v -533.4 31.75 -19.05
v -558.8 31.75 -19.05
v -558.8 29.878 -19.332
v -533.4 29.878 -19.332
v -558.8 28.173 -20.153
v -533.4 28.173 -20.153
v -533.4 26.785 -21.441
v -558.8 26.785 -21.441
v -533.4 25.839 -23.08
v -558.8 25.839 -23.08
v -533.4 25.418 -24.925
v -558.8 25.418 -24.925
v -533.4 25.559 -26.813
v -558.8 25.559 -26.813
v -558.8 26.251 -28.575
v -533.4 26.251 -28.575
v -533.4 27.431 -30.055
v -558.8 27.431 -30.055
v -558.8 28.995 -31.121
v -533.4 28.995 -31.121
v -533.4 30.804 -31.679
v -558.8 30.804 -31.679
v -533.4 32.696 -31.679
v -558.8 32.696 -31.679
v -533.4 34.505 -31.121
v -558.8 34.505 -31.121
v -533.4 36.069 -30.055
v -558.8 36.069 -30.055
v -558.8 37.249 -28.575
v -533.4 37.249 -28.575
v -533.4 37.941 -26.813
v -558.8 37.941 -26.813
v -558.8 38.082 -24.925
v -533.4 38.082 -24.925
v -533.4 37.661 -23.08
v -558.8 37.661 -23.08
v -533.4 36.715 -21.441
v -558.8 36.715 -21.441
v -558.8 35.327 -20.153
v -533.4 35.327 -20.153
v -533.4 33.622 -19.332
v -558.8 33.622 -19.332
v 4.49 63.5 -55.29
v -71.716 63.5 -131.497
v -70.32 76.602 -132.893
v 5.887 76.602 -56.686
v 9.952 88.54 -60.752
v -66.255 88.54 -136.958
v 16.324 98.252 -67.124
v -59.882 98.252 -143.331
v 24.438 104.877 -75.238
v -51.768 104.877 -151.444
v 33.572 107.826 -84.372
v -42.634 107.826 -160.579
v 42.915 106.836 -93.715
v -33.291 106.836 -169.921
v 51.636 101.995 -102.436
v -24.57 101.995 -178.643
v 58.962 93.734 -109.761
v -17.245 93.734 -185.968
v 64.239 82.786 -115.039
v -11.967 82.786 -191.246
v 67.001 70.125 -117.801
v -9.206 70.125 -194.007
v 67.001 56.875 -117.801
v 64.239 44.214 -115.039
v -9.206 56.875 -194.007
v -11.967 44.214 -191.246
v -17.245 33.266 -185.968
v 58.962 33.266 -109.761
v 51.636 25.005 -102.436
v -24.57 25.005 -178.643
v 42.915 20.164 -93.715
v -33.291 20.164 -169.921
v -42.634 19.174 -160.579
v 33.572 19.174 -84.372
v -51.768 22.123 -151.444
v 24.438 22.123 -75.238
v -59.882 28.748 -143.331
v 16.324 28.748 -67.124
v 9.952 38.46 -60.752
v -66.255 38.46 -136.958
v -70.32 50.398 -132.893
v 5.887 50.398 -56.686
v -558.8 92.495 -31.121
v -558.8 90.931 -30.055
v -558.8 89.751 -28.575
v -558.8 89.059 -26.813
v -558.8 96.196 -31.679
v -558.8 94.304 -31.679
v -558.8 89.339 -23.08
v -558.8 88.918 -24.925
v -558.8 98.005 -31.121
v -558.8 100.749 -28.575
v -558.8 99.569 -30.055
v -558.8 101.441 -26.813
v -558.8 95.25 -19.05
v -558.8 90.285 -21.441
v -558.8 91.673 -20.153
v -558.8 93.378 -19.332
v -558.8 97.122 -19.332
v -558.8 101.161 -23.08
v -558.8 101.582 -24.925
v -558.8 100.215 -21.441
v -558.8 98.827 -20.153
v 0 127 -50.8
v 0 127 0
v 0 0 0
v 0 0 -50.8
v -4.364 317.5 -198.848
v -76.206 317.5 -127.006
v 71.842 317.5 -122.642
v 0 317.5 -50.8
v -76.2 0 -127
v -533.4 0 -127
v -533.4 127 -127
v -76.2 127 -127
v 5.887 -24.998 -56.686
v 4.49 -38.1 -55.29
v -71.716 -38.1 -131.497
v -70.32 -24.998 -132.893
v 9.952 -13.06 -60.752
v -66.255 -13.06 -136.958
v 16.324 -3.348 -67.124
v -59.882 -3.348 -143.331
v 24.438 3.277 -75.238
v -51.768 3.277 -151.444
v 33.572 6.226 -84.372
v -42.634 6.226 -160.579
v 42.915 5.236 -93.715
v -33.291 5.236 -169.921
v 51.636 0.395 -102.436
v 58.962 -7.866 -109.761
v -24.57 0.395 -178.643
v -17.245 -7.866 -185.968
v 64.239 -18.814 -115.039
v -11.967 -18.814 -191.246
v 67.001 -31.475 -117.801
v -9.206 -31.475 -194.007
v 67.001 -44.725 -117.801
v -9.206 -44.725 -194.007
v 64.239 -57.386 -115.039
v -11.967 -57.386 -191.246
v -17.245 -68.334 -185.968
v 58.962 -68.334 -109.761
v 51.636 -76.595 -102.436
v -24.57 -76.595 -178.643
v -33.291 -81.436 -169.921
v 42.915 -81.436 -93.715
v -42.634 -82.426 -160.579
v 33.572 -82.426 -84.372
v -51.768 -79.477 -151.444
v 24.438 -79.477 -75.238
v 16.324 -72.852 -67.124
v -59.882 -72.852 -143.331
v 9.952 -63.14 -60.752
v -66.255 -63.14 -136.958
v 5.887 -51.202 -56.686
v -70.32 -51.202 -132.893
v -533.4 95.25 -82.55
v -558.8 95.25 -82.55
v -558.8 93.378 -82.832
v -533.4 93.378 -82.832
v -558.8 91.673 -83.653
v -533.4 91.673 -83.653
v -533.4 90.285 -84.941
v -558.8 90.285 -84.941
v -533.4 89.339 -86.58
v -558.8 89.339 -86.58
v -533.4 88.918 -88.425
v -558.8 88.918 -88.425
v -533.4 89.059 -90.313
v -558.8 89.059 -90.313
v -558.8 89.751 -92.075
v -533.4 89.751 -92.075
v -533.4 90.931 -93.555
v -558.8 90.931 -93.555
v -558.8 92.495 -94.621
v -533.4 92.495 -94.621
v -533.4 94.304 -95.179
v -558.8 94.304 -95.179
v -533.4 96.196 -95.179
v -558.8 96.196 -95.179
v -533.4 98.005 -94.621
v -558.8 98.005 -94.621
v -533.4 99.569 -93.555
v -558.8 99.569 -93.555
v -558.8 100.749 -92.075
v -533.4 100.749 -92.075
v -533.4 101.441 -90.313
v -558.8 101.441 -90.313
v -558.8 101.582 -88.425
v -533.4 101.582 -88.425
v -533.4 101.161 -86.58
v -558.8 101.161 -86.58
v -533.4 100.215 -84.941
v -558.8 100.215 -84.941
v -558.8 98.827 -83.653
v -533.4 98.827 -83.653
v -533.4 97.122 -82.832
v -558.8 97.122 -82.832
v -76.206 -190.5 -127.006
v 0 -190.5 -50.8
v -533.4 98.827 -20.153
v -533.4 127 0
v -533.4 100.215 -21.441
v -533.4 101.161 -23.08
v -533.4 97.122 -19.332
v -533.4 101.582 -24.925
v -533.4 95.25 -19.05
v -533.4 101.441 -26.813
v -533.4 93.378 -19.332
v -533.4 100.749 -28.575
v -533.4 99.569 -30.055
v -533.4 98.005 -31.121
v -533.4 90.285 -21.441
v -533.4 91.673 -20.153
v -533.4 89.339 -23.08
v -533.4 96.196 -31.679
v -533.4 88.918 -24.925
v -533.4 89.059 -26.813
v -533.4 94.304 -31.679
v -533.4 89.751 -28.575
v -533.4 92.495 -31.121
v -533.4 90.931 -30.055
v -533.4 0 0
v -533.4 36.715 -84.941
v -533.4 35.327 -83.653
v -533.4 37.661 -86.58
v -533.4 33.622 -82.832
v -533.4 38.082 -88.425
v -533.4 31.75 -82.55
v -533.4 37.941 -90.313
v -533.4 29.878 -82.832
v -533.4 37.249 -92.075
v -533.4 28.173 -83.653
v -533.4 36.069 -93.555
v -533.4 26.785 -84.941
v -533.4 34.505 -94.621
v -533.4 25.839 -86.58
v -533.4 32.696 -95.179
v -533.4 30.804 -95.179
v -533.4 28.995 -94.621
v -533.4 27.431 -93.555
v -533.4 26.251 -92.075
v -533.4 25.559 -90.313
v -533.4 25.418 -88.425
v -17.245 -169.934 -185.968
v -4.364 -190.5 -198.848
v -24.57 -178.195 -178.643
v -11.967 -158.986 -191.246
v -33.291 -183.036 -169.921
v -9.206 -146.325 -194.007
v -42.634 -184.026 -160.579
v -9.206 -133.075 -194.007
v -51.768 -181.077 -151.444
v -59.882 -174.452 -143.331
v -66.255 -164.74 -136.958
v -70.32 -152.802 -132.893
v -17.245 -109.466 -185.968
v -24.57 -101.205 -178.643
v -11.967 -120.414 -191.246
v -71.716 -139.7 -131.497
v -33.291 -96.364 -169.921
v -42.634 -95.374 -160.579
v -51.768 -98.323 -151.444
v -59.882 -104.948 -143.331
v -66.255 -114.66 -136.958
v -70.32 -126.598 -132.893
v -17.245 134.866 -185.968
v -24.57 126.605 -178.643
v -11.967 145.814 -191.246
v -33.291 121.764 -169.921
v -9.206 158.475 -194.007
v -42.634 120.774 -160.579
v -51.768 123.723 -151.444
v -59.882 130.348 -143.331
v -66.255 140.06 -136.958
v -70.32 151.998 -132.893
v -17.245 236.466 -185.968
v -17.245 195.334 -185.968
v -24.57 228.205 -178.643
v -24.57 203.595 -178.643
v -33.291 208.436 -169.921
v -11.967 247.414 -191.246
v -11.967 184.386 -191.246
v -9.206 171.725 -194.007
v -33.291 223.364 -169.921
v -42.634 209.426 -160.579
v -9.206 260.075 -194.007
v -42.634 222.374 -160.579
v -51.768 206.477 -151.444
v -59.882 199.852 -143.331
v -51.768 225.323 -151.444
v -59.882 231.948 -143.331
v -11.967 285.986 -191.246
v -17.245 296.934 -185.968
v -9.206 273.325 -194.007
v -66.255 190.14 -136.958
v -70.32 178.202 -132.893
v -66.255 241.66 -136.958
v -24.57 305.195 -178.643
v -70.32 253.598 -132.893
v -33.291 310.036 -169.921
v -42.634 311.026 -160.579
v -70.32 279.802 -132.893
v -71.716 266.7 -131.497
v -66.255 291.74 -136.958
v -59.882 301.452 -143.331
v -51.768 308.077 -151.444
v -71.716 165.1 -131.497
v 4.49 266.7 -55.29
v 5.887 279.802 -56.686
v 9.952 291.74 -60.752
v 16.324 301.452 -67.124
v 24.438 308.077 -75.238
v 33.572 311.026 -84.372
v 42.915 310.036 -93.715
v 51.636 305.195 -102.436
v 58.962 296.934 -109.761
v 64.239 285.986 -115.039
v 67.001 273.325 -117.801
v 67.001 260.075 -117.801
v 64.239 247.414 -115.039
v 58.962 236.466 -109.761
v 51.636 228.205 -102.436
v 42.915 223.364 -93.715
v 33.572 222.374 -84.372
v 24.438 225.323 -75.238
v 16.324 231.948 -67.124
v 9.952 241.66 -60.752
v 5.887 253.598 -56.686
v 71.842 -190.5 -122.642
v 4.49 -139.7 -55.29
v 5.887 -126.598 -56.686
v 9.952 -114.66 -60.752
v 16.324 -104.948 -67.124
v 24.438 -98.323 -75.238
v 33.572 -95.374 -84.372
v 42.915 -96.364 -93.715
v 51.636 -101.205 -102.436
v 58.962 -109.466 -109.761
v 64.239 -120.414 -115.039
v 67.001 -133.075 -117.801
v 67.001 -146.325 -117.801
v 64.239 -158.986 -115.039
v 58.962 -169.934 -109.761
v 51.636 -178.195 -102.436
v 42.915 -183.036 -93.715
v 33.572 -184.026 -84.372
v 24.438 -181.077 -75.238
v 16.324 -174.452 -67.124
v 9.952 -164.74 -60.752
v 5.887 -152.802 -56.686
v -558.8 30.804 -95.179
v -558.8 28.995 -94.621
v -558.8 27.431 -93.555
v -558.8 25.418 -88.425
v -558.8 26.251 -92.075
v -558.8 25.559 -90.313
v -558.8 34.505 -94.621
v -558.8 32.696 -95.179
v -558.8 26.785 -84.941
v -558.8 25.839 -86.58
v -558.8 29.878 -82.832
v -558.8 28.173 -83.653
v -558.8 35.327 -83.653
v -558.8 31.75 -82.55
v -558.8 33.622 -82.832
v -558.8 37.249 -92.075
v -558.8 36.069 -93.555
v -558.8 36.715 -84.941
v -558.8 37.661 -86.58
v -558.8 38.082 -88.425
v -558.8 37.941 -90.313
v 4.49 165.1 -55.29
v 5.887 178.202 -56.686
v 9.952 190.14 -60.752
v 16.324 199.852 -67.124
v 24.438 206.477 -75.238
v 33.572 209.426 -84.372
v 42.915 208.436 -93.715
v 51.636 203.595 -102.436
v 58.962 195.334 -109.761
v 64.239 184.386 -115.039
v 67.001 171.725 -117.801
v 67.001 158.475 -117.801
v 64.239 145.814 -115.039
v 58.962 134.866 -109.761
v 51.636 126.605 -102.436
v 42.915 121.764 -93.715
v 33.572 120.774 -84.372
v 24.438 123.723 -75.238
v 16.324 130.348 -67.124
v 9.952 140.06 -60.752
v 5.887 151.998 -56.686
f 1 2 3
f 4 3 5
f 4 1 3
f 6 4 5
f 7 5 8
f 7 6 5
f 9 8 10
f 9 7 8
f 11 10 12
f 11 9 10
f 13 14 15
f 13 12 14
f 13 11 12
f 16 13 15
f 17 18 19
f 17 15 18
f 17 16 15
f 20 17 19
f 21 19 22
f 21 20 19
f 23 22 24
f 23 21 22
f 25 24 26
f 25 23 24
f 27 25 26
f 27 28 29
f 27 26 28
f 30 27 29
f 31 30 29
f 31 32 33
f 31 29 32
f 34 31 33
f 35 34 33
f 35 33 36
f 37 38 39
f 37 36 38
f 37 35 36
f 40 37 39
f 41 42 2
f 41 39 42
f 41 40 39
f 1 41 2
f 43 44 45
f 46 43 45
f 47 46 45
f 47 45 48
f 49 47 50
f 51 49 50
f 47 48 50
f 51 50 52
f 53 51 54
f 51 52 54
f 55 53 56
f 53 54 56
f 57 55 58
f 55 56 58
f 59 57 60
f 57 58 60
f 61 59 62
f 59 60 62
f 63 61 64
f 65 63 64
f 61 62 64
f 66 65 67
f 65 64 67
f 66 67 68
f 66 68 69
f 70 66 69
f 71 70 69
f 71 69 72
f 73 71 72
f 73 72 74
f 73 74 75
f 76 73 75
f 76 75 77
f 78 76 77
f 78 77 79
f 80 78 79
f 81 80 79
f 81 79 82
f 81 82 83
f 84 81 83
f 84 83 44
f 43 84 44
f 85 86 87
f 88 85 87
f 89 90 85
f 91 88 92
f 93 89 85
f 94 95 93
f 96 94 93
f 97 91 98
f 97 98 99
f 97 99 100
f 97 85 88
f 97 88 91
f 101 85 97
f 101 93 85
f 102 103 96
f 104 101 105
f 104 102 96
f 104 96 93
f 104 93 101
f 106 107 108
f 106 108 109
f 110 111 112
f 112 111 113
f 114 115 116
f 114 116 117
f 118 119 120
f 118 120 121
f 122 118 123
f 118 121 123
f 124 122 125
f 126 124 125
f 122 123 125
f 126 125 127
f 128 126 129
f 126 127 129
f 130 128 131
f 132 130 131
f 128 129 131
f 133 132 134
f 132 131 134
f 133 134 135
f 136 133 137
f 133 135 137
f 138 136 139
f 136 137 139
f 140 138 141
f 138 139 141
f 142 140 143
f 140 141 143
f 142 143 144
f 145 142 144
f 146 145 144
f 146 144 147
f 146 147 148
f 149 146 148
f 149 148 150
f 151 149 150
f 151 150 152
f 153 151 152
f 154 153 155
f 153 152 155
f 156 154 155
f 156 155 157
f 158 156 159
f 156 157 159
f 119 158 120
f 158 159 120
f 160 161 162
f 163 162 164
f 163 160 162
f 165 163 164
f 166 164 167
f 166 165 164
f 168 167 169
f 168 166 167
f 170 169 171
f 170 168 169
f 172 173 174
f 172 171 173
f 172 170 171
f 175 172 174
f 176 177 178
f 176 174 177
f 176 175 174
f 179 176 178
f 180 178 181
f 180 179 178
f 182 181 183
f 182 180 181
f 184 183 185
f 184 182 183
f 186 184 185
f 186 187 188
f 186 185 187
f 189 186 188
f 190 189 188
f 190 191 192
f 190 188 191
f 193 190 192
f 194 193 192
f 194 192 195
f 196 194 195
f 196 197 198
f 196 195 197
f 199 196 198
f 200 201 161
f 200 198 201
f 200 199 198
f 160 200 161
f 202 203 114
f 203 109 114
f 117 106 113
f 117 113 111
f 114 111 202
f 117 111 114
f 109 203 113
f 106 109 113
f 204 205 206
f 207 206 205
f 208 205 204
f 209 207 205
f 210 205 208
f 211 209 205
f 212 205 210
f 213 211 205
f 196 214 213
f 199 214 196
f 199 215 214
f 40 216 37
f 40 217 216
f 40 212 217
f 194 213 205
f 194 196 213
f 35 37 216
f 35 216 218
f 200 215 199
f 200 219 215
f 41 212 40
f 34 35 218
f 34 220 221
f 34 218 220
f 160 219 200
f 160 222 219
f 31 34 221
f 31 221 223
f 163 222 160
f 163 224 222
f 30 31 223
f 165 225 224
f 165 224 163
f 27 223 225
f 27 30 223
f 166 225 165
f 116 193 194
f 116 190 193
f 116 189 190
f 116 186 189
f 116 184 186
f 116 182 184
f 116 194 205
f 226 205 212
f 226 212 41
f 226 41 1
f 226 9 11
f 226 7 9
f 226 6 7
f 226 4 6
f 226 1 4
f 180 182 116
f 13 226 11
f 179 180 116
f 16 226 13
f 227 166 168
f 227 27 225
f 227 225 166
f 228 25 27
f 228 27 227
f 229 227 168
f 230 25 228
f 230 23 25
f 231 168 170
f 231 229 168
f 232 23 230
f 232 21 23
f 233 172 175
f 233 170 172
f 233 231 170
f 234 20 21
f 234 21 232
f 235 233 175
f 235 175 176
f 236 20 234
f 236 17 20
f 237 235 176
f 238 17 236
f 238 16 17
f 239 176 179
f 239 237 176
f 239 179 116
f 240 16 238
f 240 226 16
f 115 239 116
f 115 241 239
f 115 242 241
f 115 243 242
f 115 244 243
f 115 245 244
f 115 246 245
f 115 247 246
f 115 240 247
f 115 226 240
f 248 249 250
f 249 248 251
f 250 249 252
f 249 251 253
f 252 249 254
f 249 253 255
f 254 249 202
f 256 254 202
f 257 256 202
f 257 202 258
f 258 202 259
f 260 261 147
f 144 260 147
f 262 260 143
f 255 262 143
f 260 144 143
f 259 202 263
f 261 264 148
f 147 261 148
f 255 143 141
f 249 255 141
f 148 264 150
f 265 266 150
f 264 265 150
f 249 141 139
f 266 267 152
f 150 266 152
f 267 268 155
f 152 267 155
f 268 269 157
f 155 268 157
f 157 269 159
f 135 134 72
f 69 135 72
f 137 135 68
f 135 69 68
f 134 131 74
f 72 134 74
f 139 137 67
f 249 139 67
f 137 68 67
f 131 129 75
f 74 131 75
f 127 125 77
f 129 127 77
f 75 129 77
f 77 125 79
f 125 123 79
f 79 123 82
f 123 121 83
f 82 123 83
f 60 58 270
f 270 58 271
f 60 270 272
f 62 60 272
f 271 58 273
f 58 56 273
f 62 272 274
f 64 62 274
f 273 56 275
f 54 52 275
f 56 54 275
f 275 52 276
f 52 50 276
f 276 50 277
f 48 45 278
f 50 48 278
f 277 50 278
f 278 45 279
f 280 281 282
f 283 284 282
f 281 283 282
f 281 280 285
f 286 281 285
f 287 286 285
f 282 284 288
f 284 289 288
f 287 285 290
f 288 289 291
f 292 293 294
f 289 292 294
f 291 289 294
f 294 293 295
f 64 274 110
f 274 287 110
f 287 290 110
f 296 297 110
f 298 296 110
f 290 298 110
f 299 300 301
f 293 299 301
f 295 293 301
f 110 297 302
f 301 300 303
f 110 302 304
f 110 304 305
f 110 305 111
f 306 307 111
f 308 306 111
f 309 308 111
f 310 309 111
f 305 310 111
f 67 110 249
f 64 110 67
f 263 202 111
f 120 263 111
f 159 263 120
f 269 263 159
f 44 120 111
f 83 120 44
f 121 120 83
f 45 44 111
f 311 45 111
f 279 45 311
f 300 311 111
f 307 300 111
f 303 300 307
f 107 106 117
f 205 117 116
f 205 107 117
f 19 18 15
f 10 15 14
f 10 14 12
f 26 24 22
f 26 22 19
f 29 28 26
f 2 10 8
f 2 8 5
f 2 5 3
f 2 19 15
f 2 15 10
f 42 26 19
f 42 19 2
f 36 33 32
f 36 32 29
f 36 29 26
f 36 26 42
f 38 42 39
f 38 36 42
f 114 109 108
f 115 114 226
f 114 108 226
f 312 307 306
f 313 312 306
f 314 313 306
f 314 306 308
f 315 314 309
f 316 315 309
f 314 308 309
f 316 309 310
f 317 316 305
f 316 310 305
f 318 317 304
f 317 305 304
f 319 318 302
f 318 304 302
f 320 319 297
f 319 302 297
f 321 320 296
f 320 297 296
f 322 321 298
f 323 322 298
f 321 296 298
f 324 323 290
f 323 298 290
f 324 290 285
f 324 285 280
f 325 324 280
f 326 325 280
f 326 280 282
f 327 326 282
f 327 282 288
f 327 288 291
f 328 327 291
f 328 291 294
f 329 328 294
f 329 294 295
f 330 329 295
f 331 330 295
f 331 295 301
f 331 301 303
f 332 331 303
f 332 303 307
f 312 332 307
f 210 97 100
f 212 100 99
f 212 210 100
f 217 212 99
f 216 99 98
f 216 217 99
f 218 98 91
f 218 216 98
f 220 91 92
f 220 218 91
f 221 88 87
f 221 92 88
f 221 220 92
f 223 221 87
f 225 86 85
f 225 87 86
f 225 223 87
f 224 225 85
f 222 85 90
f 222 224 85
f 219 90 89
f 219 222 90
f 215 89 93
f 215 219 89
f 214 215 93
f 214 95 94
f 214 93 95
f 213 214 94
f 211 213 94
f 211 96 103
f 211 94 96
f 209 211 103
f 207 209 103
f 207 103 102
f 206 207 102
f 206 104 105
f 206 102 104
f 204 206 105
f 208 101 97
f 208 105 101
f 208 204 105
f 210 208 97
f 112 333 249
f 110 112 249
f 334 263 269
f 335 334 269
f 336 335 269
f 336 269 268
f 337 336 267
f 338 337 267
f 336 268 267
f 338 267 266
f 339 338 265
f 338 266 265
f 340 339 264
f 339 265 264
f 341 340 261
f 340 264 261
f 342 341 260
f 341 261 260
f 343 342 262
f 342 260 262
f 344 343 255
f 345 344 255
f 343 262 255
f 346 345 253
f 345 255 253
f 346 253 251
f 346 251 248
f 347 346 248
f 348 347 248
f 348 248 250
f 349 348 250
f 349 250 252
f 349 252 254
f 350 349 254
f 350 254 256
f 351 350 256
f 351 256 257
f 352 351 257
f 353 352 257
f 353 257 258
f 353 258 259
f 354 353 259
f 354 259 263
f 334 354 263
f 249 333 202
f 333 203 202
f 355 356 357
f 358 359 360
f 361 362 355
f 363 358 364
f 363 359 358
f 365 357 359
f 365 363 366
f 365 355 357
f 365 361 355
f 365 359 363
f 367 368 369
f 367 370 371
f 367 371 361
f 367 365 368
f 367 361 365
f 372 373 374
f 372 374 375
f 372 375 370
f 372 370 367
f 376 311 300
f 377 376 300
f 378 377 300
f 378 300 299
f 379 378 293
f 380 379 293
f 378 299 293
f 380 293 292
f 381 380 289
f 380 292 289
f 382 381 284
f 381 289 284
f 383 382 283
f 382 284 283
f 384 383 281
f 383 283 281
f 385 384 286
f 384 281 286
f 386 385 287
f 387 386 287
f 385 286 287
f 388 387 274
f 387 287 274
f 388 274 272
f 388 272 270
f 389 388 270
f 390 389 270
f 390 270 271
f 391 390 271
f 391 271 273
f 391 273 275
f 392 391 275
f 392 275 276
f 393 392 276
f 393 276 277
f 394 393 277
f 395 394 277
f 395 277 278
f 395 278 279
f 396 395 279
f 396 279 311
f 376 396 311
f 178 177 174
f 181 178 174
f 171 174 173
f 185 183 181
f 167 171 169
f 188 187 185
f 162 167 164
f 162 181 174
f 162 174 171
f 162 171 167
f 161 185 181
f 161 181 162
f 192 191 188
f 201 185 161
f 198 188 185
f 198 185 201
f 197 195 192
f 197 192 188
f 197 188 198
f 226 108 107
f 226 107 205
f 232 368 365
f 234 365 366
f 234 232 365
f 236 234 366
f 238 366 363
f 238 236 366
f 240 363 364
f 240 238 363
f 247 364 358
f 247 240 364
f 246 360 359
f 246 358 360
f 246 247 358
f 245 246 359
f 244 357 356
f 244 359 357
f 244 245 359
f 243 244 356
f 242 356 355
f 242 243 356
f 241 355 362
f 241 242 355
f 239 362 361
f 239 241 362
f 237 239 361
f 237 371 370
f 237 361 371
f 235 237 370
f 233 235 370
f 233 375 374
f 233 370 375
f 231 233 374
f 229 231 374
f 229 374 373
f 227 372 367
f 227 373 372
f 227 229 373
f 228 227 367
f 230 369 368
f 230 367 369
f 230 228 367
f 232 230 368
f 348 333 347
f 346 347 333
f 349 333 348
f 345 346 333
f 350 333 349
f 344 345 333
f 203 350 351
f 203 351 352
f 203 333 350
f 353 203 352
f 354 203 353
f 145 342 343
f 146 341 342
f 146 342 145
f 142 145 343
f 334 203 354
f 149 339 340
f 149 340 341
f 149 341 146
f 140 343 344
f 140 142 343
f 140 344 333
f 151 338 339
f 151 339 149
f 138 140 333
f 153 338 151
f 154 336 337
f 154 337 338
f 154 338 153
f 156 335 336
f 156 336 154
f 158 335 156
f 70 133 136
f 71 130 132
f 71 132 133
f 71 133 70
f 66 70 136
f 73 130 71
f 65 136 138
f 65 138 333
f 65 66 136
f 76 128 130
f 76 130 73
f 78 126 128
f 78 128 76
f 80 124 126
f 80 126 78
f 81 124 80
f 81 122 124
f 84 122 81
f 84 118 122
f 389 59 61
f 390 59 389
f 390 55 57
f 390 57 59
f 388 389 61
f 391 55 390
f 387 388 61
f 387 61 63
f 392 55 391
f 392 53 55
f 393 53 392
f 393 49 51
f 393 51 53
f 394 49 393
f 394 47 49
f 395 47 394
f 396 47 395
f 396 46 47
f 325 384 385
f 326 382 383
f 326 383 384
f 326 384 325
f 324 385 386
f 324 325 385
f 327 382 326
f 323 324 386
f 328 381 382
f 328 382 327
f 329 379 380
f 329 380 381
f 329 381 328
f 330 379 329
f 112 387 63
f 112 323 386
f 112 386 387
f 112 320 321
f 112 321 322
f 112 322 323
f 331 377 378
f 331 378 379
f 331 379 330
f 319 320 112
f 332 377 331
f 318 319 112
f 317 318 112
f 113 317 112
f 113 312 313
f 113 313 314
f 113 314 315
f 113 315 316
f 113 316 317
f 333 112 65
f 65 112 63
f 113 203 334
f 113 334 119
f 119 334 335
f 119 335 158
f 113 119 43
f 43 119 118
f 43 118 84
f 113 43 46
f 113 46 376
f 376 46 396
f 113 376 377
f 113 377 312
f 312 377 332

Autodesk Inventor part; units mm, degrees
ref_plane "YZ Plane" through (0, 0, 0) normal (1, 0, 0) x (0, 1, 0)
ref_plane "XZ Plane" through (0, 0, 0) normal (0, 1, 0) x (-1, 0, 0)
ref_plane "XY Plane" through (0, 0, 0) normal (0, 0, 1) x (1, 0, 0)
sketch "Sketch1" plane through (0, 0, 0) normal (0, 1, 0) x (-1, 0, 0)
  line L0 (0, 0) -> (0, -50.8)
  line L1 (0, -50.8) -> (76.2, -127)
  line L2 (127, -127) -> (76.2, -127)
  line L3 (0, 0) -> (127, 0)
  line L4 (127, 0) -> (533.4, 0)
  line L5 (533.4, 0) -> (533.4, -127)
  line L6 (533.4, -127) -> (127, -127)
  dimension "d7" = 135
  dimension "d37" = 406.4
extrude "Extrusion1" add sketch "Sketch1" along normal blind 127
sketch "Sketch2" plane through (-76.2, 0, -127) normal (0.7071, 0, -0.7071) x (-0.7071, 0, -0.7071)
  line L0 (-107.7631, 0) -> (0, 0)
  line L1 (0, 0) -> (0, 127)
  line L2 (-107.7631, 127) -> (0, 127)
  line L3 (-107.7631, 0) -> (-107.7631, 127)
  line L4 (-107.7631, -190.5) -> (0.0091, -190.5)
  line L5 (0.0091, -190.5) -> (0.0091, 317.5)
  line L6 (0.0091, 317.5) -> (-107.7631, 317.5)
  line L7 (-107.7631, -190.5) -> (-107.7631, 317.5)
  point P0 (-143.6841, 0)
  dimension "d9" = 107.7722
  dimension "d10" = 508
extrude "Extrusion2" add sketch "Sketch2" along normal blind 101.6
sketch "Sketch3" plane through (-76.2065, -190.5, -127.0065) normal (-0.7071, 0, -0.7071) x (-0.7071, 0, 0.7071)
  line L0 (0, 0) -> (-101.6, 0)
  line L1 (0, 508) -> (-101.6, 508)
  circle A0 centre (-50.8, 50.8) radius 44.45
  circle A1 centre (-50.8, 152.4) radius 44.45
  circle A2 centre (-50.8, 254) radius 44.45
  circle A3 centre (-50.8, 355.6) radius 44.45
  circle A4 centre (-50.8, 457.2) radius 44.45
  point P0 (35.921, 190.5)
extrude "Extrusion3" cut sketch "Sketch3" against normal blind 127
sketch "Sketch4" plane through (-533.4, 0, -127) normal (-1, 0, 0) x (0, 0, 1)
  line L0 (0, 0) -> (0, 127) construction
  line L1 (76.2, 0) -> (0, 0) construction
  line L2 (0, 63.5) -> (76.2, 0) construction
  line L3 (76.2, 0) -> (127, 63.5) construction
  line L4 (127, 0) -> (127, 127) construction
  line L5 (76.2, 127) -> (0, 127) construction
  line L6 (0, 63.5) -> (76.2, 127) construction
  line L7 (76.2, 127) -> (127, 63.5) construction
  line L8 (38.1, 31.75) -> (101.6, 31.75) construction
  line L9 (38.1, 95.25) -> (101.6, 95.25) construction
  circle A0 centre (38.1, 31.75) radius 6.35
  circle A1 centre (38.1, 95.25) radius 6.35
  circle A2 centre (101.6, 95.25) radius 6.35
  circle A3 centre (101.6, 31.75) radius 6.35
  dimension "d38" = 12.7
  dimension "d39" = 12.7
  dimension "d40" = 12.7
  dimension "d41" = 12.7
extrude "Extrusion4" add sketch "Sketch4" along normal blind 25.4
thread "Thread1"
thread "Thread2"
thread "Thread3"
thread "Thread4"
properties part number "TubeHolderV3"
